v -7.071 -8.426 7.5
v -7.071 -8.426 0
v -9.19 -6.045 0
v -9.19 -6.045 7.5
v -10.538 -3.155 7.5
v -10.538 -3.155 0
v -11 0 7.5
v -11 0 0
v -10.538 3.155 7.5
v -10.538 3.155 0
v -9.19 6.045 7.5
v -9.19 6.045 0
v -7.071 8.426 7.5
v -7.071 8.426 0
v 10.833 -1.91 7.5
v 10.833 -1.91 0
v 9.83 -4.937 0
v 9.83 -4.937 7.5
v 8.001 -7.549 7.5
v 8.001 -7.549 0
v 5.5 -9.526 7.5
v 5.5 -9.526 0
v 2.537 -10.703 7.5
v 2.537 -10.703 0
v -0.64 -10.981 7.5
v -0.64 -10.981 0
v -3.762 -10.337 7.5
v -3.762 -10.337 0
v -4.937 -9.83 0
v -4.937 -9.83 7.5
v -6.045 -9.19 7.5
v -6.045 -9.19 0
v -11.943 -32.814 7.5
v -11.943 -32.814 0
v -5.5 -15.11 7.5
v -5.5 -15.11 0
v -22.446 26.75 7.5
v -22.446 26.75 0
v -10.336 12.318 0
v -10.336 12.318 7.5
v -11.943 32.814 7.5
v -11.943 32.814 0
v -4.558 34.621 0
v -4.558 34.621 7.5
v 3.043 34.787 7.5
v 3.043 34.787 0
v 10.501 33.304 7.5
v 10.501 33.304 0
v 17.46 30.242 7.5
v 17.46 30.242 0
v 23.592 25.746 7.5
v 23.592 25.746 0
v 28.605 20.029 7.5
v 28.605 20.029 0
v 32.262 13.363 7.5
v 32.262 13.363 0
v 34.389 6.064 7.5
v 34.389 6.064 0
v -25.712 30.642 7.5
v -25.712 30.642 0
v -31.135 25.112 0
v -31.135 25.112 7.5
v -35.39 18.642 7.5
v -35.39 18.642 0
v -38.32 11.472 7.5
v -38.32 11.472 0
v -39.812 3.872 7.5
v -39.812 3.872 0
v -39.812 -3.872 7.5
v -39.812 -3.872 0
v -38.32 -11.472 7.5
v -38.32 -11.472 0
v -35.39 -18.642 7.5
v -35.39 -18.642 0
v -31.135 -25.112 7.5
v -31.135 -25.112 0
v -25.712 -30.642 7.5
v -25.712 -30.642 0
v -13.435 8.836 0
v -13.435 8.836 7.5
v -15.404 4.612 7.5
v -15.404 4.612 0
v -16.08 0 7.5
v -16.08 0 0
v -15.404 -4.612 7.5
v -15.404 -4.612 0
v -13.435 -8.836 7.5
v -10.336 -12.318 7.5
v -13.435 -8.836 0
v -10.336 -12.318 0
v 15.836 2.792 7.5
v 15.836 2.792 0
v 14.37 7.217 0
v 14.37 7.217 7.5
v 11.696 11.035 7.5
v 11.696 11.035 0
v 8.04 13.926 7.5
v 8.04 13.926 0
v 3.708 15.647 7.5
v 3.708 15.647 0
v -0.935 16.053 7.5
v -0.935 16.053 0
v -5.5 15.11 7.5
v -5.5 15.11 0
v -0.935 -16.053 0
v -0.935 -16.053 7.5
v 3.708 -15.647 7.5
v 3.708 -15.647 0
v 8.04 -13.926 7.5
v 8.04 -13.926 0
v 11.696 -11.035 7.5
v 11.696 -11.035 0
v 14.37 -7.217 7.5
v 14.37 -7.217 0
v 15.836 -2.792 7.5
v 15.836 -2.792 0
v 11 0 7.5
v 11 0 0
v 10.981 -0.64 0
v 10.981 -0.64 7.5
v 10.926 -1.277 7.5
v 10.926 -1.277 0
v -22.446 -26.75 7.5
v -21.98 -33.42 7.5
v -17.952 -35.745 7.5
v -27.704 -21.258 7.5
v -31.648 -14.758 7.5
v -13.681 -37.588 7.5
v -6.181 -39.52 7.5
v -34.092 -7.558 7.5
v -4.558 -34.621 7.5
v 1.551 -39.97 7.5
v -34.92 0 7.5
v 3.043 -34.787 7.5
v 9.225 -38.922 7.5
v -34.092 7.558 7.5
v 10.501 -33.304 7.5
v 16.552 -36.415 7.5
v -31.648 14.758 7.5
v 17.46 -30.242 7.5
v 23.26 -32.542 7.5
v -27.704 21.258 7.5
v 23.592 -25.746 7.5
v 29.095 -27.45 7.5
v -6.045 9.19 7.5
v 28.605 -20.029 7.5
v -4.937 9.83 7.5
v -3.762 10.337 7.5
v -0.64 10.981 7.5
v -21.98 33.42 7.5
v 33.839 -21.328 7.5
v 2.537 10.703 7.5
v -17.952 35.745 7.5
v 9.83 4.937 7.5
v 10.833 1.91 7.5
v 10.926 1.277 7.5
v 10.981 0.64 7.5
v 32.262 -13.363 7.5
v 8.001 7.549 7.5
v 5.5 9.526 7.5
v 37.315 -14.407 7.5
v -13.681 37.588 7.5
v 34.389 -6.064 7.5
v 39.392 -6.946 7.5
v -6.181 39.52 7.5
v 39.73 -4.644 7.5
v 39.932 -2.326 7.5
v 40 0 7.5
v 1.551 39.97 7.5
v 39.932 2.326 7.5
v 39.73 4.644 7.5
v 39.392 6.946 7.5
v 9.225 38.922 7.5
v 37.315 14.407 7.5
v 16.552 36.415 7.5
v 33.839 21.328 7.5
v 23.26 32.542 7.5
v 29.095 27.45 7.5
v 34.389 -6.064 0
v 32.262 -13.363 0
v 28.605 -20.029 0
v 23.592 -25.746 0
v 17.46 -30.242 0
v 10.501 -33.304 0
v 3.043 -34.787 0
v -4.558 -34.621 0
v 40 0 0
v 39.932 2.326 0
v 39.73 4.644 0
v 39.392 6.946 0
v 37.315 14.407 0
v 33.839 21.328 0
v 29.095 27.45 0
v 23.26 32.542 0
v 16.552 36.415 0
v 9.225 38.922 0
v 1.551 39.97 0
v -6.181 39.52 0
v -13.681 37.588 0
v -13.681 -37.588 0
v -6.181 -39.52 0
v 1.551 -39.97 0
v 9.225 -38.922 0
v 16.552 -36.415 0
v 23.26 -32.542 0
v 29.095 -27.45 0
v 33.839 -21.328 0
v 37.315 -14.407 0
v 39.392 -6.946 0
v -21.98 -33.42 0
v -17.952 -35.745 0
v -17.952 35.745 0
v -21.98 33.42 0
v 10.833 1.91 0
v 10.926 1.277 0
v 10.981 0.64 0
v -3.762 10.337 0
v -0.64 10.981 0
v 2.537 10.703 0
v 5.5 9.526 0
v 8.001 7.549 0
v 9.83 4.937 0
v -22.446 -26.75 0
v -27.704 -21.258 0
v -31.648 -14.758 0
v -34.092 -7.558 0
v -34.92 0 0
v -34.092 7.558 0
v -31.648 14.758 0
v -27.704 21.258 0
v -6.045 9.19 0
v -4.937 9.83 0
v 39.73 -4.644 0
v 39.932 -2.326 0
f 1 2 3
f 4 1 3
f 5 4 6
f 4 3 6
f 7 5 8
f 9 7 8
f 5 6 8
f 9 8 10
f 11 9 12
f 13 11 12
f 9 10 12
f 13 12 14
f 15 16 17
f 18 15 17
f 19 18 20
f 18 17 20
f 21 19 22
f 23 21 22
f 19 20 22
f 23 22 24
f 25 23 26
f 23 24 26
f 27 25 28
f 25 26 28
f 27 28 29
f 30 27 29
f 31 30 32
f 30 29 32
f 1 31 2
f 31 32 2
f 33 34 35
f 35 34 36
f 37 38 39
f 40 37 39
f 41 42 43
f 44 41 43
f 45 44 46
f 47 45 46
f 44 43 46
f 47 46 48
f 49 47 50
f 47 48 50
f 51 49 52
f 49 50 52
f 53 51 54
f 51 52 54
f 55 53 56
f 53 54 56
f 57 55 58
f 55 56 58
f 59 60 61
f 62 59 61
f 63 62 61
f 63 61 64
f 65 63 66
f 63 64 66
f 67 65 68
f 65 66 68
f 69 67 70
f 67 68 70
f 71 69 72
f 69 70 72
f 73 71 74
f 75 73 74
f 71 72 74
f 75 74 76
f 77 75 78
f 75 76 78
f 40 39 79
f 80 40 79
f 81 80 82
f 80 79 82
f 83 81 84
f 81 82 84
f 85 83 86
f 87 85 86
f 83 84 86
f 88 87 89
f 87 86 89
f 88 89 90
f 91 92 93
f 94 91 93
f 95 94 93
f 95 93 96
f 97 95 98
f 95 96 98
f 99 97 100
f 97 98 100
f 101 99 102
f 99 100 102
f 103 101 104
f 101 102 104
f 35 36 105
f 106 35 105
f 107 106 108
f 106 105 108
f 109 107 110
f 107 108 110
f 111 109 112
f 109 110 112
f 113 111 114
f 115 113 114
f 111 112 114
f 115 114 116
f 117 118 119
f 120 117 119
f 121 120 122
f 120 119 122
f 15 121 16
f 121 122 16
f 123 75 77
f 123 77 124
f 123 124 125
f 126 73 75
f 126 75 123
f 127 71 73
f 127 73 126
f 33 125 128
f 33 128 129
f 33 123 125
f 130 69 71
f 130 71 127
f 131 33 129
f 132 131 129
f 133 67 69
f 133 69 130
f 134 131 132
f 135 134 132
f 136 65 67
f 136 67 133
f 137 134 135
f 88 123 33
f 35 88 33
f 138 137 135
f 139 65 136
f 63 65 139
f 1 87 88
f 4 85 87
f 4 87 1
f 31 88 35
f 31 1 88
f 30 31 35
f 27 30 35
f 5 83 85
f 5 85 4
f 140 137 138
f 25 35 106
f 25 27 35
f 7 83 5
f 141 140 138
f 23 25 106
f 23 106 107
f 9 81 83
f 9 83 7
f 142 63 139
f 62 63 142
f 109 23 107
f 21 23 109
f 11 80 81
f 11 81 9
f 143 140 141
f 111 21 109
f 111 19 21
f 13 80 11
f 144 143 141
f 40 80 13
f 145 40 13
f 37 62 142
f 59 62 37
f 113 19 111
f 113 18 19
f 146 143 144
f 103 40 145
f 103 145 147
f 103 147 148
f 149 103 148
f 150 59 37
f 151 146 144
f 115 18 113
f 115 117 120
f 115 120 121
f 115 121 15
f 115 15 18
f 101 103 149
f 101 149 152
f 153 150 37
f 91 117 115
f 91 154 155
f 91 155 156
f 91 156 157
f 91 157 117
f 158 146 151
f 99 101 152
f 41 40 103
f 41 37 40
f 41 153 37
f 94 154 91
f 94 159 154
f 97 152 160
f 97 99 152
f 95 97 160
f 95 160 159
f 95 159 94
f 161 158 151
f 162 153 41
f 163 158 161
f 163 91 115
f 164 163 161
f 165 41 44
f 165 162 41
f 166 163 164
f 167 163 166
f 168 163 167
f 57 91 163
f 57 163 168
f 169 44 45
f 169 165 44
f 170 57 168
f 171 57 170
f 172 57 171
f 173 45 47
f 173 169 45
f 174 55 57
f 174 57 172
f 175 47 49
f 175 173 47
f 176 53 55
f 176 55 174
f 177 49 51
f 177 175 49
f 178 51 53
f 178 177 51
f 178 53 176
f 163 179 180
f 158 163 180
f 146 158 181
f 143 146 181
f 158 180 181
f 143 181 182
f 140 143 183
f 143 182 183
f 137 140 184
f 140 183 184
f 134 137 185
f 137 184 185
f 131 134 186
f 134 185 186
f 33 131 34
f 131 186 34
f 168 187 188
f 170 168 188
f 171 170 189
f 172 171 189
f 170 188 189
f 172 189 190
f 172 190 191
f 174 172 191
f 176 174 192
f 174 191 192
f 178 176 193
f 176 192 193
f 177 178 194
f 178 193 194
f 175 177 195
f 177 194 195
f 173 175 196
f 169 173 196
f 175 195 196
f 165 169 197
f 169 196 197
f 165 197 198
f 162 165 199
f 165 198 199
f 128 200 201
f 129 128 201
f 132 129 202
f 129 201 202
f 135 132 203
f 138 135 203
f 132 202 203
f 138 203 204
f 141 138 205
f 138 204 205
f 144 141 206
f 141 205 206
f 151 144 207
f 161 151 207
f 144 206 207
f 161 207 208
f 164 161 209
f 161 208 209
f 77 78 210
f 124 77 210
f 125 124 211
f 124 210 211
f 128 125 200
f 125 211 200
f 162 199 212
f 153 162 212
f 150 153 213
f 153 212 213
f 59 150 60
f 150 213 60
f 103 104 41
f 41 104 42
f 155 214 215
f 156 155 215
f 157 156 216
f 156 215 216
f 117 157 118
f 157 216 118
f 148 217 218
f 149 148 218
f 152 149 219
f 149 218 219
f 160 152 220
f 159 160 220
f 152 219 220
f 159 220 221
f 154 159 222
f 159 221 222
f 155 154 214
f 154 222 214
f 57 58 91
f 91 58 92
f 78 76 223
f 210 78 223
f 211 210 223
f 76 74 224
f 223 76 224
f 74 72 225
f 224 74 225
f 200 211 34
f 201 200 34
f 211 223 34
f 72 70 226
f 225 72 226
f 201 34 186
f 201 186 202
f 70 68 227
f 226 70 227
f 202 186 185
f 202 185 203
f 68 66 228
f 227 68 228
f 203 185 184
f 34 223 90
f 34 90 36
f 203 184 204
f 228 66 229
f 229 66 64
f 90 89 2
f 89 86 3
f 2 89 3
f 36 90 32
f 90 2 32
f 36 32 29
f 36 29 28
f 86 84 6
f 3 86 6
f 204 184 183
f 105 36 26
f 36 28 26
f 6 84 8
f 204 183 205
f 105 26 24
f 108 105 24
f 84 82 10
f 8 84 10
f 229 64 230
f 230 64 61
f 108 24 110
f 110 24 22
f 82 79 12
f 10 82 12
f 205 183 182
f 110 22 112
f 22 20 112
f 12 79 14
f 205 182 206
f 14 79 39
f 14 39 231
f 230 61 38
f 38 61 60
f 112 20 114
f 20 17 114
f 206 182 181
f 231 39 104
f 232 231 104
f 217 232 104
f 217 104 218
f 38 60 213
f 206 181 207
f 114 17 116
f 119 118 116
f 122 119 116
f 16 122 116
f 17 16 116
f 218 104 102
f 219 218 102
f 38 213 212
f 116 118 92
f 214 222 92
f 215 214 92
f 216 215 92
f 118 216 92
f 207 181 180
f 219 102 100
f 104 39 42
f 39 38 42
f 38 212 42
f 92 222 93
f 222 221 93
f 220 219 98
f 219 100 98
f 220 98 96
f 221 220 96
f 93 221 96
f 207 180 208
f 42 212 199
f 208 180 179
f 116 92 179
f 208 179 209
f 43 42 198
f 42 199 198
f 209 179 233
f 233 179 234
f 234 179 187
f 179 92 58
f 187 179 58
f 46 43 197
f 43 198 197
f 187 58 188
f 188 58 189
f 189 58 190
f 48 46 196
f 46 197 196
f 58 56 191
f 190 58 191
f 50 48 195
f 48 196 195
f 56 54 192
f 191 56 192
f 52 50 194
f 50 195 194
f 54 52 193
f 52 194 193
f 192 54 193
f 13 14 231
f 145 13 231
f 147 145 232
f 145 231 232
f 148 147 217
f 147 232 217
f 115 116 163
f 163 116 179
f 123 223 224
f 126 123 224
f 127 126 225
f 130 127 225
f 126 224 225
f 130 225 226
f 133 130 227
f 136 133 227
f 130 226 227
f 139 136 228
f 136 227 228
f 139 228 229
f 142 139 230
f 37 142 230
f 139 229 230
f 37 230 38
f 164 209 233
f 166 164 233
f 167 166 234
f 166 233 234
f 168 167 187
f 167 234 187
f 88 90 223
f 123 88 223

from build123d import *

# Parameters (mm, degrees)
F1_DEPTH = 7.5


with BuildPart() as f1:
    # F0 (on Top) → F1 (new body)
    with BuildSketch(Plane.XY):
        with BuildLine():
            ThreePointArc((-22.4461433303, 26.7502719537), (-17.46, 30.2416071002), (-11.9433434049, 32.8140663178))
            Line((-11.9433434049, 32.8140663178), (-13.680805733, 37.5877048314))
            ThreePointArc((-13.680805733, 37.5877048314), (-20, 34.6410161514), (-25.7115043875, 30.6417777248))
            Line((-25.7115043875, 30.6417777248), (-22.4461433303, 26.7502719537))
        make_face()
        with BuildLine():
            ThreePointArc((-22.4461433303, -26.7502719537), (-34.92, 0), (-22.4461433303, 26.7502719537))
            Line((-22.4461433303, 26.7502719537), (-25.7115043875, 30.6417777248))
            ThreePointArc((-25.7115043875, 30.6417777248), (-40, 0), (-25.7115043875, -30.6417777248))
            Line((-25.7115043875, -30.6417777248), (-22.4461433303, -26.7502719537))
        make_face()
        with BuildLine():
            ThreePointArc((-11.9433434049, 32.8140663178), (17.46, 30.2416071002), (34.3894867352, 6.0637943641))
            Line((34.3894867352, 6.0637943641), (39.3923101205, 6.9459271067))
            ThreePointArc((39.3923101205, 6.9459271067), (20, 34.6410161514), (-13.680805733, 37.5877048314))
            Line((-13.680805733, 37.5877048314), (-11.9433434049, 32.8140663178))
        make_face()
        with BuildLine():
            Line((39.3923101205, 6.9459271067), (34.3894867352, 6.0637943641))
            ThreePointArc((34.3894867352, 6.0637943641), (34.7871188574, 3.0434785367), (34.92, 0))
            ThreePointArc((34.92, 0), (34.7871188574, -3.0434785367), (34.3894867352, -6.0637943641))
            Line((34.3894867352, -6.0637943641), (39.3923101205, -6.9459271067))
            ThreePointArc((39.3923101205, -6.9459271067), (39.8477879237, -3.4862297099), (40, 0))
            ThreePointArc((40, 0), (39.8477879237, 3.4862297099), (39.3923101205, 6.9459271067))
        make_face()
        with BuildLine():
            Line((34.3894867352, 6.0637943641), (15.8357086684, 2.7922626969))
            ThreePointArc((15.8357086684, 2.7922626969), (16.0188107453, 1.4014643434), (16.08, 0))
            ThreePointArc((16.08, 0), (16.0188107453, -1.4014643434), (15.8357086684, -2.7922626969))
            Line((15.8357086684, -2.7922626969), (34.3894867352, -6.0637943641))
            ThreePointArc((34.3894867352, -6.0637943641), (34.7871188574, -3.0434785367), (34.92, 0))
            ThreePointArc((34.92, 0), (34.7871188574, 3.0434785367), (34.3894867352, 6.0637943641))
        make_face()
        with BuildLine():
            ThreePointArc((10.8328852831, 1.9101299543), (10.958141679, 0.9587131702), (11, 0))
            ThreePointArc((11, 0), (10.958141679, -0.9587131702), (10.8328852831, -1.9101299543))
            Line((10.8328852831, -1.9101299543), (15.8357086684, -2.7922626969))
            ThreePointArc((15.8357086684, -2.7922626969), (16.0188107453, -1.4014643434), (16.08, 0))
            ThreePointArc((16.08, 0), (16.0188107453, 1.4014643434), (15.8357086684, 2.7922626969))
            Line((15.8357086684, 2.7922626969), (10.8328852831, 1.9101299543))
        make_face()
        with BuildLine():
            ThreePointArc((-3.7622215766, 10.3366188286), (5.5, 9.5262794416), (10.8328852831, 1.9101299543))
            Line((10.8328852831, 1.9101299543), (15.8357086684, 2.7922626969))
            ThreePointArc((15.8357086684, 2.7922626969), (8.04, 13.9256884929), (-5.4996839047, 15.1102573422))
            Line((-5.4996839047, 15.1102573422), (-3.7622215766, 10.3366188286))
        make_face()
        with BuildLine():
            ThreePointArc((-7.0706637066, 8.4264888743), (-5.5, 9.5262794416), (-3.7622215766, 10.3366188286))
            Line((-3.7622215766, 10.3366188286), (-5.4996839047, 15.1102573422))
            ThreePointArc((-5.4996839047, 15.1102573422), (-8.04, 13.9256884929), (-10.3360247638, 12.3179946454))
            Line((-10.3360247638, 12.3179946454), (-7.0706637066, 8.4264888743))
        make_face()
        with BuildLine():
            ThreePointArc((-10.3360247638, 12.3179946454), (-8.04, 13.9256884929), (-5.4996839047, 15.1102573422))
            Line((-5.4996839047, 15.1102573422), (-11.9433434049, 32.8140663178))
            ThreePointArc((-11.9433434049, 32.8140663178), (-17.46, 30.2416071002), (-22.4461433303, 26.7502719537))
            Line((-22.4461433303, 26.7502719537), (-10.3360247638, 12.3179946454))
        make_face()
        with BuildLine():
            ThreePointArc((-7.0706637066, -8.4264888743), (-11, 0), (-7.0706637066, 8.4264888743))
            Line((-7.0706637066, 8.4264888743), (-10.3360247638, 12.3179946454))
            ThreePointArc((-10.3360247638, 12.3179946454), (-16.08, 0), (-10.3360247638, -12.3179946454))
            Line((-10.3360247638, -12.3179946454), (-7.0706637066, -8.4264888743))
        make_face()
        with BuildLine():
            Line((-5.4996839047, -15.1102573422), (-3.7622215766, -10.3366188286))
            ThreePointArc((-3.7622215766, -10.3366188286), (-5.5, -9.5262794416), (-7.0706637066, -8.4264888743))
            Line((-7.0706637066, -8.4264888743), (-10.3360247638, -12.3179946454))
            ThreePointArc((-10.3360247638, -12.3179946454), (-8.04, -13.9256884929), (-5.4996839047, -15.1102573422))
        make_face()
        with BuildLine():
            Line((15.8357086684, -2.7922626969), (10.8328852831, -1.9101299543))
            ThreePointArc((10.8328852831, -1.9101299543), (5.5, -9.5262794416), (-3.7622215766, -10.3366188286))
            Line((-3.7622215766, -10.3366188286), (-5.4996839047, -15.1102573422))
            ThreePointArc((-5.4996839047, -15.1102573422), (8.04, -13.9256884929), (15.8357086684, -2.7922626969))
        make_face()
        with BuildLine():
            Line((-11.9433434049, -32.8140663178), (-5.4996839047, -15.1102573422))
            ThreePointArc((-5.4996839047, -15.1102573422), (-8.04, -13.9256884929), (-10.3360247638, -12.3179946454))
            Line((-10.3360247638, -12.3179946454), (-22.4461433303, -26.7502719537))
            ThreePointArc((-22.4461433303, -26.7502719537), (-17.46, -30.2416071002), (-11.9433434049, -32.8140663178))
        make_face()
        with BuildLine():
            Line((-13.680805733, -37.5877048314), (-11.9433434049, -32.8140663178))
            ThreePointArc((-11.9433434049, -32.8140663178), (-17.46, -30.2416071002), (-22.4461433303, -26.7502719537))
            Line((-22.4461433303, -26.7502719537), (-25.7115043875, -30.6417777248))
            ThreePointArc((-25.7115043875, -30.6417777248), (-20, -34.6410161514), (-13.680805733, -37.5877048314))
        make_face()
        with BuildLine():
            Line((39.3923101205, -6.9459271067), (34.3894867352, -6.0637943641))
            ThreePointArc((34.3894867352, -6.0637943641), (17.46, -30.2416071002), (-11.9433434049, -32.8140663178))
            Line((-11.9433434049, -32.8140663178), (-13.680805733, -37.5877048314))
            ThreePointArc((-13.680805733, -37.5877048314), (20, -34.6410161514), (39.3923101205, -6.9459271067))
        make_face()
    extrude(amount=F1_DEPTH)


solid = f1.part
